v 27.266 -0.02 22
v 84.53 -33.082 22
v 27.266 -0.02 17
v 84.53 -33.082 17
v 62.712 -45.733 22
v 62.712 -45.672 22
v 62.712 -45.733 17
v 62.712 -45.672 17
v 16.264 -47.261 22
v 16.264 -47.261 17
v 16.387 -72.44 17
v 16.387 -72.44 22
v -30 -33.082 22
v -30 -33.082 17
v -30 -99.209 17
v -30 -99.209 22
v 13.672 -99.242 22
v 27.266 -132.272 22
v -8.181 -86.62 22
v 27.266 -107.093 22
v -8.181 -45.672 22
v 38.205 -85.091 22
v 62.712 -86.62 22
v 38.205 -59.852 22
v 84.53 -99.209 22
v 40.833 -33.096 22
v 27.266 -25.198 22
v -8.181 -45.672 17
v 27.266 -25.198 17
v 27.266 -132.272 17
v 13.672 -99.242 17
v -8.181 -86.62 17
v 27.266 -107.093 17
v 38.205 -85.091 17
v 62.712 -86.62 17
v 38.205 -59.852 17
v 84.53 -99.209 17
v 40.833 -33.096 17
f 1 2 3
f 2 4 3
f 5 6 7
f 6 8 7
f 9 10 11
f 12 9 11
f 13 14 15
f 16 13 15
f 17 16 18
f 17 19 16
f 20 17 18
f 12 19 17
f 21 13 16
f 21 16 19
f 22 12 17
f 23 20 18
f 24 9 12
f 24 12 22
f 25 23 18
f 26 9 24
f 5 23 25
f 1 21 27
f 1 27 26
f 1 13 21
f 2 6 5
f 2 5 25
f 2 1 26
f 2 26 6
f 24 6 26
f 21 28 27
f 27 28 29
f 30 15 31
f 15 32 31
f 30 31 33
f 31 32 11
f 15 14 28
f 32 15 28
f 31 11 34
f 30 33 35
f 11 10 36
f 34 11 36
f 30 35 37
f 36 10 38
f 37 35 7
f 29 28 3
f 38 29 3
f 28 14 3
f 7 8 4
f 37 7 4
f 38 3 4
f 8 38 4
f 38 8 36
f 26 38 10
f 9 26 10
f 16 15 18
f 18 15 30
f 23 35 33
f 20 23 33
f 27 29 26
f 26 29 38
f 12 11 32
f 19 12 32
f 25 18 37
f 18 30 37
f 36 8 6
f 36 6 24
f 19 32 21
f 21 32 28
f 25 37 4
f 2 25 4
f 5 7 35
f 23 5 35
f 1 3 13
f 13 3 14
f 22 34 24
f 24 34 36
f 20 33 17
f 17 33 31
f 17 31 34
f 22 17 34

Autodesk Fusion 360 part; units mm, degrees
sketch "Sketch1" plane through (0, 0, 0) normal (0, 0, 1) x (1, 0, 0)
  line L0 (27.2658, -132.272) -> (-30, -99.2094)
  line L1 (-30, -99.2094) -> (-30, -33.0822)
  line L2 (-30, -33.0822) -> (27.2658, -0.0196)
  line L3 (27.2658, -0.0196) -> (84.5305, -33.0822)
  line L4 (84.5305, -33.0822) -> (84.5305, -99.2094)
  line L5 (84.5305, -99.2094) -> (27.2658, -132.272)
  line L6 (-8.1812, -86.62) -> (27.2658, -107.0932)
  line L7 (27.2658, -107.0932) -> (62.7117, -86.62)
  line L8 (62.7117, -86.62) -> (62.7117, -45.6716)
  line L9 (62.7117, -45.6716) -> (27.2658, -25.1985)
  line L10 (27.2658, -25.1985) -> (-8.1812, -45.6716)
  line L11 (-8.1812, -45.6716) -> (-8.1812, -86.62)
  line L12 (16.2638, -72.502) -> (16.2638, -47.2612)
  line L13 (38.2046, -59.8516) -> (38.2046, -85.0914)
  line L14 (-30, -33.0822) -> (-30, -99.2094)
  line L15 (-8.1812, -86.62) -> (-8.1812, -45.6716)
  line L16 (-8.1812, -45.6716) -> (27.2658, -25.2594)
  line L17 (27.2658, -25.2594) -> (62.7117, -45.6716)
  line L18 (62.7117, -45.6716) -> (62.7117, -45.7326)
  line L19 (84.5305, -33.0822) -> (27.2658, -0.0196)
  line L20 (27.2658, -0.0196) -> (-30, -33.0822)
  line L21 (38.2046, -59.8516) -> (38.2046, -85.0914)
  line L22 (13.6721, -99.2419) -> (-8.1812, -86.62)
  line L23 (40.8862, -33.0655) -> (62.7117, -45.7326)
  line L24 (27.2658, -25.2594) -> (62.7117, -45.7326)
  line L25 (-8.1812, -86.62) -> (27.2658, -107.0932)
  line L26 (16.2638, -47.2612) -> (40.8862, -33.0655)
  line L27 (27.2658, -25.2594) -> (-8.1812, -45.6716)
  line L28 (-8.1812, -86.62) -> (-8.1812, -45.6716)
  line L29 (-8.1812, -86.62) -> (16.3868, -72.44)
  line L30 (16.3868, -72.44) -> (16.2638, -47.2612)
  line L31 (16.2638, -47.2612) -> (40.8862, -33.0655)
  line L32 (38.2046, -85.0914) -> (13.6721, -99.2419)
  line L33 (13.6721, -99.2419) -> (27.2658, -107.0932)
  line L34 (62.7117, -86.62) -> (62.7117, -45.7326)
  line L35 (27.2658, -107.0932) -> (62.7117, -86.62)
  line L36 (38.2046, -85.0914) -> (38.2046, -59.8516)
  line L37 (38.2046, -59.8516) -> (62.7117, -45.7326)
extrude "Extrude1" add sketch "Sketch1" along normal blind 10 contours L0 L1 L2 L3 L4 L5 L14 L19 L20 | L6 L13 L21 L22 L24 L25 L26 L29 L30 L31 L32 L36 L37 makes body 1
sketch "Sketch2" plane through (0, 0, 10) normal (0, 0, 1) x (1, 0, 0)
  line L0 (62.7117, -45.6716) -> (62.7117, -45.7326)
  line L1 (62.7117, -45.7326) -> (62.7117, -86.62)
  line L2 (62.7117, -86.62) -> (27.2658, -107.0932)
  line L3 (27.2658, -107.0932) -> (13.6721, -99.2419)
  line L4 (13.6721, -99.2419) -> (38.2046, -85.0914)
  line L5 (38.2046, -85.0914) -> (38.2046, -59.8516)
  line L6 (38.2046, -59.8516) -> (62.7117, -45.7326)
  line L7 (40.8333, -33.0959) -> (16.2638, -47.2612)
  line L8 (16.2638, -47.2612) -> (16.3868, -72.44)
  line L9 (16.3868, -72.44) -> (-8.1812, -86.62)
  line L10 (-8.1812, -86.62) -> (-8.1812, -45.6716)
  line L11 (-8.1812, -45.6716) -> (27.2658, -25.1985)
  line L12 (84.5305, -33.0822) -> (27.2658, -0.0196)
  line L13 (27.2658, -0.0196) -> (-30, -33.0822)
  line L14 (-30, -33.0822) -> (-30, -99.2094)
  line L15 (-30, -99.2094) -> (27.2658, -132.272)
  line L16 (27.2658, -132.272) -> (84.5305, -99.2094)
  line L17 (84.5305, -99.2094) -> (84.5305, -33.0822)
extrude "Extrude2" add 1 faces at (3.646, -110.2411, 10) along direction (0, 0, 1) blind 7 separate body on bodies 1 makes body 2
sketch "Sketch3" plane through (0, 0, 17) normal (0, 0, 1) x (1, 0, 0)
  line L0 (62.7117, -45.6716) -> (62.7117, -45.7326)
  line L1 (62.7117, -45.7326) -> (62.7117, -86.62)
  line L2 (62.7117, -86.62) -> (27.2658, -107.0932)
  line L3 (27.2658, -107.0932) -> (13.6721, -99.2419)
  line L4 (13.6721, -99.2419) -> (38.2046, -85.0914)
  line L5 (38.2046, -85.0914) -> (38.2046, -59.8516)
  line L6 (38.2046, -59.8516) -> (62.7117, -45.7326)
  line L7 (40.8333, -33.0959) -> (16.2638, -47.2612)
  line L8 (16.2638, -47.2612) -> (16.3868, -72.44)
  line L9 (16.3868, -72.44) -> (-8.1812, -86.62)
  line L10 (-8.1812, -86.62) -> (-8.1812, -45.6716)
  line L11 (-8.1812, -45.6716) -> (27.2658, -25.1985)
  line L12 (84.5305, -33.0822) -> (27.2658, -0.0196)
  line L13 (27.2658, -0.0196) -> (-30, -33.0822)
  line L14 (-30, -33.0822) -> (-30, -99.2094)
  line L15 (-30, -99.2094) -> (27.2658, -132.272)
  line L16 (27.2658, -132.272) -> (84.5305, -99.2094)
  line L17 (84.5305, -99.2094) -> (84.5305, -33.0822)
  line L18 (-30, -33.0822) -> (27.2658, -0.0196)
  line L19 (84.5305, -33.0822) -> (27.2658, -0.0196)
  line L20 (-30, -33.0822) -> (-30, -99.2094)
  line L21 (-30, -99.2094) -> (27.2658, -132.272)
  line L22 (27.2658, -132.272) -> (84.5305, -99.2094)
  line L23 (84.5305, -33.0822) -> (84.5305, -99.2094)
  line L24 (-8.1812, -45.6716) -> (27.2658, -25.1985)
  line L25 (16.2638, -47.2612) -> (40.8333, -33.0959)
  line L26 (16.2638, -47.2612) -> (16.3868, -72.44)
  line L27 (-8.1812, -86.62) -> (16.3868, -72.44)
  line L28 (-8.1812, -86.62) -> (-8.1812, -45.6716)
  line L29 (62.7117, -45.6716) -> (38.2046, -59.8516)
  line L30 (38.2046, -85.0914) -> (13.6721, -99.2419)
  line L31 (27.2658, -107.0932) -> (13.6721, -99.2419)
  line L32 (27.2658, -107.0932) -> (62.7117, -86.62)
  line L33 (62.7117, -86.62) -> (62.7117, -45.6716)
  line L34 (38.2046, -85.0914) -> (38.2046, -59.8516)
  line L35 (27.2658, -25.1985) -> (40.8333, -33.0959)
  point P0 (27.2658, -25.1985)
extrude "Extrude3" add sketch "Sketch3" along normal blind 5 separate body makes body 3
sketch "Sketch4" plane through (0, 0, 22) normal (0, 0, 1) x (1, 0, 0)
  line L0 (62.7117, -86.62) -> (27.2658, -107.0932)
  line L1 (27.2658, -107.0932) -> (13.6721, -99.2419)
  line L2 (13.6721, -99.2419) -> (38.2046, -85.0914)
  line L3 (38.2046, -85.0914) -> (38.2046, -59.8516)
  line L4 (38.2046, -59.8516) -> (62.7117, -45.6716)
  line L5 (62.7117, -45.6716) -> (62.7117, -86.62)
  line L6 (16.3868, -72.44) -> (-8.1812, -86.62)
  line L7 (-8.1812, -86.62) -> (-8.1812, -45.6716)
  line L8 (-8.1812, -45.6716) -> (27.2658, -25.1985)
  line L9 (27.2658, -25.1985) -> (40.8333, -33.0959)
  line L10 (40.8333, -33.0959) -> (16.2638, -47.2612)
  line L11 (16.2638, -47.2612) -> (16.3868, -72.44)
  line L12 (-30, -33.0822) -> (-30, -99.2094)
  line L13 (-30, -99.2094) -> (27.2658, -132.272)
  line L14 (27.2658, -132.272) -> (84.5305, -99.2094)
  line L15 (84.5305, -99.2094) -> (84.5305, -33.0822)
  line L16 (84.5305, -33.0822) -> (27.2658, -0.0196)
  line L17 (27.2658, -0.0196) -> (-30, -33.0822)
hidden bodies 1 2
